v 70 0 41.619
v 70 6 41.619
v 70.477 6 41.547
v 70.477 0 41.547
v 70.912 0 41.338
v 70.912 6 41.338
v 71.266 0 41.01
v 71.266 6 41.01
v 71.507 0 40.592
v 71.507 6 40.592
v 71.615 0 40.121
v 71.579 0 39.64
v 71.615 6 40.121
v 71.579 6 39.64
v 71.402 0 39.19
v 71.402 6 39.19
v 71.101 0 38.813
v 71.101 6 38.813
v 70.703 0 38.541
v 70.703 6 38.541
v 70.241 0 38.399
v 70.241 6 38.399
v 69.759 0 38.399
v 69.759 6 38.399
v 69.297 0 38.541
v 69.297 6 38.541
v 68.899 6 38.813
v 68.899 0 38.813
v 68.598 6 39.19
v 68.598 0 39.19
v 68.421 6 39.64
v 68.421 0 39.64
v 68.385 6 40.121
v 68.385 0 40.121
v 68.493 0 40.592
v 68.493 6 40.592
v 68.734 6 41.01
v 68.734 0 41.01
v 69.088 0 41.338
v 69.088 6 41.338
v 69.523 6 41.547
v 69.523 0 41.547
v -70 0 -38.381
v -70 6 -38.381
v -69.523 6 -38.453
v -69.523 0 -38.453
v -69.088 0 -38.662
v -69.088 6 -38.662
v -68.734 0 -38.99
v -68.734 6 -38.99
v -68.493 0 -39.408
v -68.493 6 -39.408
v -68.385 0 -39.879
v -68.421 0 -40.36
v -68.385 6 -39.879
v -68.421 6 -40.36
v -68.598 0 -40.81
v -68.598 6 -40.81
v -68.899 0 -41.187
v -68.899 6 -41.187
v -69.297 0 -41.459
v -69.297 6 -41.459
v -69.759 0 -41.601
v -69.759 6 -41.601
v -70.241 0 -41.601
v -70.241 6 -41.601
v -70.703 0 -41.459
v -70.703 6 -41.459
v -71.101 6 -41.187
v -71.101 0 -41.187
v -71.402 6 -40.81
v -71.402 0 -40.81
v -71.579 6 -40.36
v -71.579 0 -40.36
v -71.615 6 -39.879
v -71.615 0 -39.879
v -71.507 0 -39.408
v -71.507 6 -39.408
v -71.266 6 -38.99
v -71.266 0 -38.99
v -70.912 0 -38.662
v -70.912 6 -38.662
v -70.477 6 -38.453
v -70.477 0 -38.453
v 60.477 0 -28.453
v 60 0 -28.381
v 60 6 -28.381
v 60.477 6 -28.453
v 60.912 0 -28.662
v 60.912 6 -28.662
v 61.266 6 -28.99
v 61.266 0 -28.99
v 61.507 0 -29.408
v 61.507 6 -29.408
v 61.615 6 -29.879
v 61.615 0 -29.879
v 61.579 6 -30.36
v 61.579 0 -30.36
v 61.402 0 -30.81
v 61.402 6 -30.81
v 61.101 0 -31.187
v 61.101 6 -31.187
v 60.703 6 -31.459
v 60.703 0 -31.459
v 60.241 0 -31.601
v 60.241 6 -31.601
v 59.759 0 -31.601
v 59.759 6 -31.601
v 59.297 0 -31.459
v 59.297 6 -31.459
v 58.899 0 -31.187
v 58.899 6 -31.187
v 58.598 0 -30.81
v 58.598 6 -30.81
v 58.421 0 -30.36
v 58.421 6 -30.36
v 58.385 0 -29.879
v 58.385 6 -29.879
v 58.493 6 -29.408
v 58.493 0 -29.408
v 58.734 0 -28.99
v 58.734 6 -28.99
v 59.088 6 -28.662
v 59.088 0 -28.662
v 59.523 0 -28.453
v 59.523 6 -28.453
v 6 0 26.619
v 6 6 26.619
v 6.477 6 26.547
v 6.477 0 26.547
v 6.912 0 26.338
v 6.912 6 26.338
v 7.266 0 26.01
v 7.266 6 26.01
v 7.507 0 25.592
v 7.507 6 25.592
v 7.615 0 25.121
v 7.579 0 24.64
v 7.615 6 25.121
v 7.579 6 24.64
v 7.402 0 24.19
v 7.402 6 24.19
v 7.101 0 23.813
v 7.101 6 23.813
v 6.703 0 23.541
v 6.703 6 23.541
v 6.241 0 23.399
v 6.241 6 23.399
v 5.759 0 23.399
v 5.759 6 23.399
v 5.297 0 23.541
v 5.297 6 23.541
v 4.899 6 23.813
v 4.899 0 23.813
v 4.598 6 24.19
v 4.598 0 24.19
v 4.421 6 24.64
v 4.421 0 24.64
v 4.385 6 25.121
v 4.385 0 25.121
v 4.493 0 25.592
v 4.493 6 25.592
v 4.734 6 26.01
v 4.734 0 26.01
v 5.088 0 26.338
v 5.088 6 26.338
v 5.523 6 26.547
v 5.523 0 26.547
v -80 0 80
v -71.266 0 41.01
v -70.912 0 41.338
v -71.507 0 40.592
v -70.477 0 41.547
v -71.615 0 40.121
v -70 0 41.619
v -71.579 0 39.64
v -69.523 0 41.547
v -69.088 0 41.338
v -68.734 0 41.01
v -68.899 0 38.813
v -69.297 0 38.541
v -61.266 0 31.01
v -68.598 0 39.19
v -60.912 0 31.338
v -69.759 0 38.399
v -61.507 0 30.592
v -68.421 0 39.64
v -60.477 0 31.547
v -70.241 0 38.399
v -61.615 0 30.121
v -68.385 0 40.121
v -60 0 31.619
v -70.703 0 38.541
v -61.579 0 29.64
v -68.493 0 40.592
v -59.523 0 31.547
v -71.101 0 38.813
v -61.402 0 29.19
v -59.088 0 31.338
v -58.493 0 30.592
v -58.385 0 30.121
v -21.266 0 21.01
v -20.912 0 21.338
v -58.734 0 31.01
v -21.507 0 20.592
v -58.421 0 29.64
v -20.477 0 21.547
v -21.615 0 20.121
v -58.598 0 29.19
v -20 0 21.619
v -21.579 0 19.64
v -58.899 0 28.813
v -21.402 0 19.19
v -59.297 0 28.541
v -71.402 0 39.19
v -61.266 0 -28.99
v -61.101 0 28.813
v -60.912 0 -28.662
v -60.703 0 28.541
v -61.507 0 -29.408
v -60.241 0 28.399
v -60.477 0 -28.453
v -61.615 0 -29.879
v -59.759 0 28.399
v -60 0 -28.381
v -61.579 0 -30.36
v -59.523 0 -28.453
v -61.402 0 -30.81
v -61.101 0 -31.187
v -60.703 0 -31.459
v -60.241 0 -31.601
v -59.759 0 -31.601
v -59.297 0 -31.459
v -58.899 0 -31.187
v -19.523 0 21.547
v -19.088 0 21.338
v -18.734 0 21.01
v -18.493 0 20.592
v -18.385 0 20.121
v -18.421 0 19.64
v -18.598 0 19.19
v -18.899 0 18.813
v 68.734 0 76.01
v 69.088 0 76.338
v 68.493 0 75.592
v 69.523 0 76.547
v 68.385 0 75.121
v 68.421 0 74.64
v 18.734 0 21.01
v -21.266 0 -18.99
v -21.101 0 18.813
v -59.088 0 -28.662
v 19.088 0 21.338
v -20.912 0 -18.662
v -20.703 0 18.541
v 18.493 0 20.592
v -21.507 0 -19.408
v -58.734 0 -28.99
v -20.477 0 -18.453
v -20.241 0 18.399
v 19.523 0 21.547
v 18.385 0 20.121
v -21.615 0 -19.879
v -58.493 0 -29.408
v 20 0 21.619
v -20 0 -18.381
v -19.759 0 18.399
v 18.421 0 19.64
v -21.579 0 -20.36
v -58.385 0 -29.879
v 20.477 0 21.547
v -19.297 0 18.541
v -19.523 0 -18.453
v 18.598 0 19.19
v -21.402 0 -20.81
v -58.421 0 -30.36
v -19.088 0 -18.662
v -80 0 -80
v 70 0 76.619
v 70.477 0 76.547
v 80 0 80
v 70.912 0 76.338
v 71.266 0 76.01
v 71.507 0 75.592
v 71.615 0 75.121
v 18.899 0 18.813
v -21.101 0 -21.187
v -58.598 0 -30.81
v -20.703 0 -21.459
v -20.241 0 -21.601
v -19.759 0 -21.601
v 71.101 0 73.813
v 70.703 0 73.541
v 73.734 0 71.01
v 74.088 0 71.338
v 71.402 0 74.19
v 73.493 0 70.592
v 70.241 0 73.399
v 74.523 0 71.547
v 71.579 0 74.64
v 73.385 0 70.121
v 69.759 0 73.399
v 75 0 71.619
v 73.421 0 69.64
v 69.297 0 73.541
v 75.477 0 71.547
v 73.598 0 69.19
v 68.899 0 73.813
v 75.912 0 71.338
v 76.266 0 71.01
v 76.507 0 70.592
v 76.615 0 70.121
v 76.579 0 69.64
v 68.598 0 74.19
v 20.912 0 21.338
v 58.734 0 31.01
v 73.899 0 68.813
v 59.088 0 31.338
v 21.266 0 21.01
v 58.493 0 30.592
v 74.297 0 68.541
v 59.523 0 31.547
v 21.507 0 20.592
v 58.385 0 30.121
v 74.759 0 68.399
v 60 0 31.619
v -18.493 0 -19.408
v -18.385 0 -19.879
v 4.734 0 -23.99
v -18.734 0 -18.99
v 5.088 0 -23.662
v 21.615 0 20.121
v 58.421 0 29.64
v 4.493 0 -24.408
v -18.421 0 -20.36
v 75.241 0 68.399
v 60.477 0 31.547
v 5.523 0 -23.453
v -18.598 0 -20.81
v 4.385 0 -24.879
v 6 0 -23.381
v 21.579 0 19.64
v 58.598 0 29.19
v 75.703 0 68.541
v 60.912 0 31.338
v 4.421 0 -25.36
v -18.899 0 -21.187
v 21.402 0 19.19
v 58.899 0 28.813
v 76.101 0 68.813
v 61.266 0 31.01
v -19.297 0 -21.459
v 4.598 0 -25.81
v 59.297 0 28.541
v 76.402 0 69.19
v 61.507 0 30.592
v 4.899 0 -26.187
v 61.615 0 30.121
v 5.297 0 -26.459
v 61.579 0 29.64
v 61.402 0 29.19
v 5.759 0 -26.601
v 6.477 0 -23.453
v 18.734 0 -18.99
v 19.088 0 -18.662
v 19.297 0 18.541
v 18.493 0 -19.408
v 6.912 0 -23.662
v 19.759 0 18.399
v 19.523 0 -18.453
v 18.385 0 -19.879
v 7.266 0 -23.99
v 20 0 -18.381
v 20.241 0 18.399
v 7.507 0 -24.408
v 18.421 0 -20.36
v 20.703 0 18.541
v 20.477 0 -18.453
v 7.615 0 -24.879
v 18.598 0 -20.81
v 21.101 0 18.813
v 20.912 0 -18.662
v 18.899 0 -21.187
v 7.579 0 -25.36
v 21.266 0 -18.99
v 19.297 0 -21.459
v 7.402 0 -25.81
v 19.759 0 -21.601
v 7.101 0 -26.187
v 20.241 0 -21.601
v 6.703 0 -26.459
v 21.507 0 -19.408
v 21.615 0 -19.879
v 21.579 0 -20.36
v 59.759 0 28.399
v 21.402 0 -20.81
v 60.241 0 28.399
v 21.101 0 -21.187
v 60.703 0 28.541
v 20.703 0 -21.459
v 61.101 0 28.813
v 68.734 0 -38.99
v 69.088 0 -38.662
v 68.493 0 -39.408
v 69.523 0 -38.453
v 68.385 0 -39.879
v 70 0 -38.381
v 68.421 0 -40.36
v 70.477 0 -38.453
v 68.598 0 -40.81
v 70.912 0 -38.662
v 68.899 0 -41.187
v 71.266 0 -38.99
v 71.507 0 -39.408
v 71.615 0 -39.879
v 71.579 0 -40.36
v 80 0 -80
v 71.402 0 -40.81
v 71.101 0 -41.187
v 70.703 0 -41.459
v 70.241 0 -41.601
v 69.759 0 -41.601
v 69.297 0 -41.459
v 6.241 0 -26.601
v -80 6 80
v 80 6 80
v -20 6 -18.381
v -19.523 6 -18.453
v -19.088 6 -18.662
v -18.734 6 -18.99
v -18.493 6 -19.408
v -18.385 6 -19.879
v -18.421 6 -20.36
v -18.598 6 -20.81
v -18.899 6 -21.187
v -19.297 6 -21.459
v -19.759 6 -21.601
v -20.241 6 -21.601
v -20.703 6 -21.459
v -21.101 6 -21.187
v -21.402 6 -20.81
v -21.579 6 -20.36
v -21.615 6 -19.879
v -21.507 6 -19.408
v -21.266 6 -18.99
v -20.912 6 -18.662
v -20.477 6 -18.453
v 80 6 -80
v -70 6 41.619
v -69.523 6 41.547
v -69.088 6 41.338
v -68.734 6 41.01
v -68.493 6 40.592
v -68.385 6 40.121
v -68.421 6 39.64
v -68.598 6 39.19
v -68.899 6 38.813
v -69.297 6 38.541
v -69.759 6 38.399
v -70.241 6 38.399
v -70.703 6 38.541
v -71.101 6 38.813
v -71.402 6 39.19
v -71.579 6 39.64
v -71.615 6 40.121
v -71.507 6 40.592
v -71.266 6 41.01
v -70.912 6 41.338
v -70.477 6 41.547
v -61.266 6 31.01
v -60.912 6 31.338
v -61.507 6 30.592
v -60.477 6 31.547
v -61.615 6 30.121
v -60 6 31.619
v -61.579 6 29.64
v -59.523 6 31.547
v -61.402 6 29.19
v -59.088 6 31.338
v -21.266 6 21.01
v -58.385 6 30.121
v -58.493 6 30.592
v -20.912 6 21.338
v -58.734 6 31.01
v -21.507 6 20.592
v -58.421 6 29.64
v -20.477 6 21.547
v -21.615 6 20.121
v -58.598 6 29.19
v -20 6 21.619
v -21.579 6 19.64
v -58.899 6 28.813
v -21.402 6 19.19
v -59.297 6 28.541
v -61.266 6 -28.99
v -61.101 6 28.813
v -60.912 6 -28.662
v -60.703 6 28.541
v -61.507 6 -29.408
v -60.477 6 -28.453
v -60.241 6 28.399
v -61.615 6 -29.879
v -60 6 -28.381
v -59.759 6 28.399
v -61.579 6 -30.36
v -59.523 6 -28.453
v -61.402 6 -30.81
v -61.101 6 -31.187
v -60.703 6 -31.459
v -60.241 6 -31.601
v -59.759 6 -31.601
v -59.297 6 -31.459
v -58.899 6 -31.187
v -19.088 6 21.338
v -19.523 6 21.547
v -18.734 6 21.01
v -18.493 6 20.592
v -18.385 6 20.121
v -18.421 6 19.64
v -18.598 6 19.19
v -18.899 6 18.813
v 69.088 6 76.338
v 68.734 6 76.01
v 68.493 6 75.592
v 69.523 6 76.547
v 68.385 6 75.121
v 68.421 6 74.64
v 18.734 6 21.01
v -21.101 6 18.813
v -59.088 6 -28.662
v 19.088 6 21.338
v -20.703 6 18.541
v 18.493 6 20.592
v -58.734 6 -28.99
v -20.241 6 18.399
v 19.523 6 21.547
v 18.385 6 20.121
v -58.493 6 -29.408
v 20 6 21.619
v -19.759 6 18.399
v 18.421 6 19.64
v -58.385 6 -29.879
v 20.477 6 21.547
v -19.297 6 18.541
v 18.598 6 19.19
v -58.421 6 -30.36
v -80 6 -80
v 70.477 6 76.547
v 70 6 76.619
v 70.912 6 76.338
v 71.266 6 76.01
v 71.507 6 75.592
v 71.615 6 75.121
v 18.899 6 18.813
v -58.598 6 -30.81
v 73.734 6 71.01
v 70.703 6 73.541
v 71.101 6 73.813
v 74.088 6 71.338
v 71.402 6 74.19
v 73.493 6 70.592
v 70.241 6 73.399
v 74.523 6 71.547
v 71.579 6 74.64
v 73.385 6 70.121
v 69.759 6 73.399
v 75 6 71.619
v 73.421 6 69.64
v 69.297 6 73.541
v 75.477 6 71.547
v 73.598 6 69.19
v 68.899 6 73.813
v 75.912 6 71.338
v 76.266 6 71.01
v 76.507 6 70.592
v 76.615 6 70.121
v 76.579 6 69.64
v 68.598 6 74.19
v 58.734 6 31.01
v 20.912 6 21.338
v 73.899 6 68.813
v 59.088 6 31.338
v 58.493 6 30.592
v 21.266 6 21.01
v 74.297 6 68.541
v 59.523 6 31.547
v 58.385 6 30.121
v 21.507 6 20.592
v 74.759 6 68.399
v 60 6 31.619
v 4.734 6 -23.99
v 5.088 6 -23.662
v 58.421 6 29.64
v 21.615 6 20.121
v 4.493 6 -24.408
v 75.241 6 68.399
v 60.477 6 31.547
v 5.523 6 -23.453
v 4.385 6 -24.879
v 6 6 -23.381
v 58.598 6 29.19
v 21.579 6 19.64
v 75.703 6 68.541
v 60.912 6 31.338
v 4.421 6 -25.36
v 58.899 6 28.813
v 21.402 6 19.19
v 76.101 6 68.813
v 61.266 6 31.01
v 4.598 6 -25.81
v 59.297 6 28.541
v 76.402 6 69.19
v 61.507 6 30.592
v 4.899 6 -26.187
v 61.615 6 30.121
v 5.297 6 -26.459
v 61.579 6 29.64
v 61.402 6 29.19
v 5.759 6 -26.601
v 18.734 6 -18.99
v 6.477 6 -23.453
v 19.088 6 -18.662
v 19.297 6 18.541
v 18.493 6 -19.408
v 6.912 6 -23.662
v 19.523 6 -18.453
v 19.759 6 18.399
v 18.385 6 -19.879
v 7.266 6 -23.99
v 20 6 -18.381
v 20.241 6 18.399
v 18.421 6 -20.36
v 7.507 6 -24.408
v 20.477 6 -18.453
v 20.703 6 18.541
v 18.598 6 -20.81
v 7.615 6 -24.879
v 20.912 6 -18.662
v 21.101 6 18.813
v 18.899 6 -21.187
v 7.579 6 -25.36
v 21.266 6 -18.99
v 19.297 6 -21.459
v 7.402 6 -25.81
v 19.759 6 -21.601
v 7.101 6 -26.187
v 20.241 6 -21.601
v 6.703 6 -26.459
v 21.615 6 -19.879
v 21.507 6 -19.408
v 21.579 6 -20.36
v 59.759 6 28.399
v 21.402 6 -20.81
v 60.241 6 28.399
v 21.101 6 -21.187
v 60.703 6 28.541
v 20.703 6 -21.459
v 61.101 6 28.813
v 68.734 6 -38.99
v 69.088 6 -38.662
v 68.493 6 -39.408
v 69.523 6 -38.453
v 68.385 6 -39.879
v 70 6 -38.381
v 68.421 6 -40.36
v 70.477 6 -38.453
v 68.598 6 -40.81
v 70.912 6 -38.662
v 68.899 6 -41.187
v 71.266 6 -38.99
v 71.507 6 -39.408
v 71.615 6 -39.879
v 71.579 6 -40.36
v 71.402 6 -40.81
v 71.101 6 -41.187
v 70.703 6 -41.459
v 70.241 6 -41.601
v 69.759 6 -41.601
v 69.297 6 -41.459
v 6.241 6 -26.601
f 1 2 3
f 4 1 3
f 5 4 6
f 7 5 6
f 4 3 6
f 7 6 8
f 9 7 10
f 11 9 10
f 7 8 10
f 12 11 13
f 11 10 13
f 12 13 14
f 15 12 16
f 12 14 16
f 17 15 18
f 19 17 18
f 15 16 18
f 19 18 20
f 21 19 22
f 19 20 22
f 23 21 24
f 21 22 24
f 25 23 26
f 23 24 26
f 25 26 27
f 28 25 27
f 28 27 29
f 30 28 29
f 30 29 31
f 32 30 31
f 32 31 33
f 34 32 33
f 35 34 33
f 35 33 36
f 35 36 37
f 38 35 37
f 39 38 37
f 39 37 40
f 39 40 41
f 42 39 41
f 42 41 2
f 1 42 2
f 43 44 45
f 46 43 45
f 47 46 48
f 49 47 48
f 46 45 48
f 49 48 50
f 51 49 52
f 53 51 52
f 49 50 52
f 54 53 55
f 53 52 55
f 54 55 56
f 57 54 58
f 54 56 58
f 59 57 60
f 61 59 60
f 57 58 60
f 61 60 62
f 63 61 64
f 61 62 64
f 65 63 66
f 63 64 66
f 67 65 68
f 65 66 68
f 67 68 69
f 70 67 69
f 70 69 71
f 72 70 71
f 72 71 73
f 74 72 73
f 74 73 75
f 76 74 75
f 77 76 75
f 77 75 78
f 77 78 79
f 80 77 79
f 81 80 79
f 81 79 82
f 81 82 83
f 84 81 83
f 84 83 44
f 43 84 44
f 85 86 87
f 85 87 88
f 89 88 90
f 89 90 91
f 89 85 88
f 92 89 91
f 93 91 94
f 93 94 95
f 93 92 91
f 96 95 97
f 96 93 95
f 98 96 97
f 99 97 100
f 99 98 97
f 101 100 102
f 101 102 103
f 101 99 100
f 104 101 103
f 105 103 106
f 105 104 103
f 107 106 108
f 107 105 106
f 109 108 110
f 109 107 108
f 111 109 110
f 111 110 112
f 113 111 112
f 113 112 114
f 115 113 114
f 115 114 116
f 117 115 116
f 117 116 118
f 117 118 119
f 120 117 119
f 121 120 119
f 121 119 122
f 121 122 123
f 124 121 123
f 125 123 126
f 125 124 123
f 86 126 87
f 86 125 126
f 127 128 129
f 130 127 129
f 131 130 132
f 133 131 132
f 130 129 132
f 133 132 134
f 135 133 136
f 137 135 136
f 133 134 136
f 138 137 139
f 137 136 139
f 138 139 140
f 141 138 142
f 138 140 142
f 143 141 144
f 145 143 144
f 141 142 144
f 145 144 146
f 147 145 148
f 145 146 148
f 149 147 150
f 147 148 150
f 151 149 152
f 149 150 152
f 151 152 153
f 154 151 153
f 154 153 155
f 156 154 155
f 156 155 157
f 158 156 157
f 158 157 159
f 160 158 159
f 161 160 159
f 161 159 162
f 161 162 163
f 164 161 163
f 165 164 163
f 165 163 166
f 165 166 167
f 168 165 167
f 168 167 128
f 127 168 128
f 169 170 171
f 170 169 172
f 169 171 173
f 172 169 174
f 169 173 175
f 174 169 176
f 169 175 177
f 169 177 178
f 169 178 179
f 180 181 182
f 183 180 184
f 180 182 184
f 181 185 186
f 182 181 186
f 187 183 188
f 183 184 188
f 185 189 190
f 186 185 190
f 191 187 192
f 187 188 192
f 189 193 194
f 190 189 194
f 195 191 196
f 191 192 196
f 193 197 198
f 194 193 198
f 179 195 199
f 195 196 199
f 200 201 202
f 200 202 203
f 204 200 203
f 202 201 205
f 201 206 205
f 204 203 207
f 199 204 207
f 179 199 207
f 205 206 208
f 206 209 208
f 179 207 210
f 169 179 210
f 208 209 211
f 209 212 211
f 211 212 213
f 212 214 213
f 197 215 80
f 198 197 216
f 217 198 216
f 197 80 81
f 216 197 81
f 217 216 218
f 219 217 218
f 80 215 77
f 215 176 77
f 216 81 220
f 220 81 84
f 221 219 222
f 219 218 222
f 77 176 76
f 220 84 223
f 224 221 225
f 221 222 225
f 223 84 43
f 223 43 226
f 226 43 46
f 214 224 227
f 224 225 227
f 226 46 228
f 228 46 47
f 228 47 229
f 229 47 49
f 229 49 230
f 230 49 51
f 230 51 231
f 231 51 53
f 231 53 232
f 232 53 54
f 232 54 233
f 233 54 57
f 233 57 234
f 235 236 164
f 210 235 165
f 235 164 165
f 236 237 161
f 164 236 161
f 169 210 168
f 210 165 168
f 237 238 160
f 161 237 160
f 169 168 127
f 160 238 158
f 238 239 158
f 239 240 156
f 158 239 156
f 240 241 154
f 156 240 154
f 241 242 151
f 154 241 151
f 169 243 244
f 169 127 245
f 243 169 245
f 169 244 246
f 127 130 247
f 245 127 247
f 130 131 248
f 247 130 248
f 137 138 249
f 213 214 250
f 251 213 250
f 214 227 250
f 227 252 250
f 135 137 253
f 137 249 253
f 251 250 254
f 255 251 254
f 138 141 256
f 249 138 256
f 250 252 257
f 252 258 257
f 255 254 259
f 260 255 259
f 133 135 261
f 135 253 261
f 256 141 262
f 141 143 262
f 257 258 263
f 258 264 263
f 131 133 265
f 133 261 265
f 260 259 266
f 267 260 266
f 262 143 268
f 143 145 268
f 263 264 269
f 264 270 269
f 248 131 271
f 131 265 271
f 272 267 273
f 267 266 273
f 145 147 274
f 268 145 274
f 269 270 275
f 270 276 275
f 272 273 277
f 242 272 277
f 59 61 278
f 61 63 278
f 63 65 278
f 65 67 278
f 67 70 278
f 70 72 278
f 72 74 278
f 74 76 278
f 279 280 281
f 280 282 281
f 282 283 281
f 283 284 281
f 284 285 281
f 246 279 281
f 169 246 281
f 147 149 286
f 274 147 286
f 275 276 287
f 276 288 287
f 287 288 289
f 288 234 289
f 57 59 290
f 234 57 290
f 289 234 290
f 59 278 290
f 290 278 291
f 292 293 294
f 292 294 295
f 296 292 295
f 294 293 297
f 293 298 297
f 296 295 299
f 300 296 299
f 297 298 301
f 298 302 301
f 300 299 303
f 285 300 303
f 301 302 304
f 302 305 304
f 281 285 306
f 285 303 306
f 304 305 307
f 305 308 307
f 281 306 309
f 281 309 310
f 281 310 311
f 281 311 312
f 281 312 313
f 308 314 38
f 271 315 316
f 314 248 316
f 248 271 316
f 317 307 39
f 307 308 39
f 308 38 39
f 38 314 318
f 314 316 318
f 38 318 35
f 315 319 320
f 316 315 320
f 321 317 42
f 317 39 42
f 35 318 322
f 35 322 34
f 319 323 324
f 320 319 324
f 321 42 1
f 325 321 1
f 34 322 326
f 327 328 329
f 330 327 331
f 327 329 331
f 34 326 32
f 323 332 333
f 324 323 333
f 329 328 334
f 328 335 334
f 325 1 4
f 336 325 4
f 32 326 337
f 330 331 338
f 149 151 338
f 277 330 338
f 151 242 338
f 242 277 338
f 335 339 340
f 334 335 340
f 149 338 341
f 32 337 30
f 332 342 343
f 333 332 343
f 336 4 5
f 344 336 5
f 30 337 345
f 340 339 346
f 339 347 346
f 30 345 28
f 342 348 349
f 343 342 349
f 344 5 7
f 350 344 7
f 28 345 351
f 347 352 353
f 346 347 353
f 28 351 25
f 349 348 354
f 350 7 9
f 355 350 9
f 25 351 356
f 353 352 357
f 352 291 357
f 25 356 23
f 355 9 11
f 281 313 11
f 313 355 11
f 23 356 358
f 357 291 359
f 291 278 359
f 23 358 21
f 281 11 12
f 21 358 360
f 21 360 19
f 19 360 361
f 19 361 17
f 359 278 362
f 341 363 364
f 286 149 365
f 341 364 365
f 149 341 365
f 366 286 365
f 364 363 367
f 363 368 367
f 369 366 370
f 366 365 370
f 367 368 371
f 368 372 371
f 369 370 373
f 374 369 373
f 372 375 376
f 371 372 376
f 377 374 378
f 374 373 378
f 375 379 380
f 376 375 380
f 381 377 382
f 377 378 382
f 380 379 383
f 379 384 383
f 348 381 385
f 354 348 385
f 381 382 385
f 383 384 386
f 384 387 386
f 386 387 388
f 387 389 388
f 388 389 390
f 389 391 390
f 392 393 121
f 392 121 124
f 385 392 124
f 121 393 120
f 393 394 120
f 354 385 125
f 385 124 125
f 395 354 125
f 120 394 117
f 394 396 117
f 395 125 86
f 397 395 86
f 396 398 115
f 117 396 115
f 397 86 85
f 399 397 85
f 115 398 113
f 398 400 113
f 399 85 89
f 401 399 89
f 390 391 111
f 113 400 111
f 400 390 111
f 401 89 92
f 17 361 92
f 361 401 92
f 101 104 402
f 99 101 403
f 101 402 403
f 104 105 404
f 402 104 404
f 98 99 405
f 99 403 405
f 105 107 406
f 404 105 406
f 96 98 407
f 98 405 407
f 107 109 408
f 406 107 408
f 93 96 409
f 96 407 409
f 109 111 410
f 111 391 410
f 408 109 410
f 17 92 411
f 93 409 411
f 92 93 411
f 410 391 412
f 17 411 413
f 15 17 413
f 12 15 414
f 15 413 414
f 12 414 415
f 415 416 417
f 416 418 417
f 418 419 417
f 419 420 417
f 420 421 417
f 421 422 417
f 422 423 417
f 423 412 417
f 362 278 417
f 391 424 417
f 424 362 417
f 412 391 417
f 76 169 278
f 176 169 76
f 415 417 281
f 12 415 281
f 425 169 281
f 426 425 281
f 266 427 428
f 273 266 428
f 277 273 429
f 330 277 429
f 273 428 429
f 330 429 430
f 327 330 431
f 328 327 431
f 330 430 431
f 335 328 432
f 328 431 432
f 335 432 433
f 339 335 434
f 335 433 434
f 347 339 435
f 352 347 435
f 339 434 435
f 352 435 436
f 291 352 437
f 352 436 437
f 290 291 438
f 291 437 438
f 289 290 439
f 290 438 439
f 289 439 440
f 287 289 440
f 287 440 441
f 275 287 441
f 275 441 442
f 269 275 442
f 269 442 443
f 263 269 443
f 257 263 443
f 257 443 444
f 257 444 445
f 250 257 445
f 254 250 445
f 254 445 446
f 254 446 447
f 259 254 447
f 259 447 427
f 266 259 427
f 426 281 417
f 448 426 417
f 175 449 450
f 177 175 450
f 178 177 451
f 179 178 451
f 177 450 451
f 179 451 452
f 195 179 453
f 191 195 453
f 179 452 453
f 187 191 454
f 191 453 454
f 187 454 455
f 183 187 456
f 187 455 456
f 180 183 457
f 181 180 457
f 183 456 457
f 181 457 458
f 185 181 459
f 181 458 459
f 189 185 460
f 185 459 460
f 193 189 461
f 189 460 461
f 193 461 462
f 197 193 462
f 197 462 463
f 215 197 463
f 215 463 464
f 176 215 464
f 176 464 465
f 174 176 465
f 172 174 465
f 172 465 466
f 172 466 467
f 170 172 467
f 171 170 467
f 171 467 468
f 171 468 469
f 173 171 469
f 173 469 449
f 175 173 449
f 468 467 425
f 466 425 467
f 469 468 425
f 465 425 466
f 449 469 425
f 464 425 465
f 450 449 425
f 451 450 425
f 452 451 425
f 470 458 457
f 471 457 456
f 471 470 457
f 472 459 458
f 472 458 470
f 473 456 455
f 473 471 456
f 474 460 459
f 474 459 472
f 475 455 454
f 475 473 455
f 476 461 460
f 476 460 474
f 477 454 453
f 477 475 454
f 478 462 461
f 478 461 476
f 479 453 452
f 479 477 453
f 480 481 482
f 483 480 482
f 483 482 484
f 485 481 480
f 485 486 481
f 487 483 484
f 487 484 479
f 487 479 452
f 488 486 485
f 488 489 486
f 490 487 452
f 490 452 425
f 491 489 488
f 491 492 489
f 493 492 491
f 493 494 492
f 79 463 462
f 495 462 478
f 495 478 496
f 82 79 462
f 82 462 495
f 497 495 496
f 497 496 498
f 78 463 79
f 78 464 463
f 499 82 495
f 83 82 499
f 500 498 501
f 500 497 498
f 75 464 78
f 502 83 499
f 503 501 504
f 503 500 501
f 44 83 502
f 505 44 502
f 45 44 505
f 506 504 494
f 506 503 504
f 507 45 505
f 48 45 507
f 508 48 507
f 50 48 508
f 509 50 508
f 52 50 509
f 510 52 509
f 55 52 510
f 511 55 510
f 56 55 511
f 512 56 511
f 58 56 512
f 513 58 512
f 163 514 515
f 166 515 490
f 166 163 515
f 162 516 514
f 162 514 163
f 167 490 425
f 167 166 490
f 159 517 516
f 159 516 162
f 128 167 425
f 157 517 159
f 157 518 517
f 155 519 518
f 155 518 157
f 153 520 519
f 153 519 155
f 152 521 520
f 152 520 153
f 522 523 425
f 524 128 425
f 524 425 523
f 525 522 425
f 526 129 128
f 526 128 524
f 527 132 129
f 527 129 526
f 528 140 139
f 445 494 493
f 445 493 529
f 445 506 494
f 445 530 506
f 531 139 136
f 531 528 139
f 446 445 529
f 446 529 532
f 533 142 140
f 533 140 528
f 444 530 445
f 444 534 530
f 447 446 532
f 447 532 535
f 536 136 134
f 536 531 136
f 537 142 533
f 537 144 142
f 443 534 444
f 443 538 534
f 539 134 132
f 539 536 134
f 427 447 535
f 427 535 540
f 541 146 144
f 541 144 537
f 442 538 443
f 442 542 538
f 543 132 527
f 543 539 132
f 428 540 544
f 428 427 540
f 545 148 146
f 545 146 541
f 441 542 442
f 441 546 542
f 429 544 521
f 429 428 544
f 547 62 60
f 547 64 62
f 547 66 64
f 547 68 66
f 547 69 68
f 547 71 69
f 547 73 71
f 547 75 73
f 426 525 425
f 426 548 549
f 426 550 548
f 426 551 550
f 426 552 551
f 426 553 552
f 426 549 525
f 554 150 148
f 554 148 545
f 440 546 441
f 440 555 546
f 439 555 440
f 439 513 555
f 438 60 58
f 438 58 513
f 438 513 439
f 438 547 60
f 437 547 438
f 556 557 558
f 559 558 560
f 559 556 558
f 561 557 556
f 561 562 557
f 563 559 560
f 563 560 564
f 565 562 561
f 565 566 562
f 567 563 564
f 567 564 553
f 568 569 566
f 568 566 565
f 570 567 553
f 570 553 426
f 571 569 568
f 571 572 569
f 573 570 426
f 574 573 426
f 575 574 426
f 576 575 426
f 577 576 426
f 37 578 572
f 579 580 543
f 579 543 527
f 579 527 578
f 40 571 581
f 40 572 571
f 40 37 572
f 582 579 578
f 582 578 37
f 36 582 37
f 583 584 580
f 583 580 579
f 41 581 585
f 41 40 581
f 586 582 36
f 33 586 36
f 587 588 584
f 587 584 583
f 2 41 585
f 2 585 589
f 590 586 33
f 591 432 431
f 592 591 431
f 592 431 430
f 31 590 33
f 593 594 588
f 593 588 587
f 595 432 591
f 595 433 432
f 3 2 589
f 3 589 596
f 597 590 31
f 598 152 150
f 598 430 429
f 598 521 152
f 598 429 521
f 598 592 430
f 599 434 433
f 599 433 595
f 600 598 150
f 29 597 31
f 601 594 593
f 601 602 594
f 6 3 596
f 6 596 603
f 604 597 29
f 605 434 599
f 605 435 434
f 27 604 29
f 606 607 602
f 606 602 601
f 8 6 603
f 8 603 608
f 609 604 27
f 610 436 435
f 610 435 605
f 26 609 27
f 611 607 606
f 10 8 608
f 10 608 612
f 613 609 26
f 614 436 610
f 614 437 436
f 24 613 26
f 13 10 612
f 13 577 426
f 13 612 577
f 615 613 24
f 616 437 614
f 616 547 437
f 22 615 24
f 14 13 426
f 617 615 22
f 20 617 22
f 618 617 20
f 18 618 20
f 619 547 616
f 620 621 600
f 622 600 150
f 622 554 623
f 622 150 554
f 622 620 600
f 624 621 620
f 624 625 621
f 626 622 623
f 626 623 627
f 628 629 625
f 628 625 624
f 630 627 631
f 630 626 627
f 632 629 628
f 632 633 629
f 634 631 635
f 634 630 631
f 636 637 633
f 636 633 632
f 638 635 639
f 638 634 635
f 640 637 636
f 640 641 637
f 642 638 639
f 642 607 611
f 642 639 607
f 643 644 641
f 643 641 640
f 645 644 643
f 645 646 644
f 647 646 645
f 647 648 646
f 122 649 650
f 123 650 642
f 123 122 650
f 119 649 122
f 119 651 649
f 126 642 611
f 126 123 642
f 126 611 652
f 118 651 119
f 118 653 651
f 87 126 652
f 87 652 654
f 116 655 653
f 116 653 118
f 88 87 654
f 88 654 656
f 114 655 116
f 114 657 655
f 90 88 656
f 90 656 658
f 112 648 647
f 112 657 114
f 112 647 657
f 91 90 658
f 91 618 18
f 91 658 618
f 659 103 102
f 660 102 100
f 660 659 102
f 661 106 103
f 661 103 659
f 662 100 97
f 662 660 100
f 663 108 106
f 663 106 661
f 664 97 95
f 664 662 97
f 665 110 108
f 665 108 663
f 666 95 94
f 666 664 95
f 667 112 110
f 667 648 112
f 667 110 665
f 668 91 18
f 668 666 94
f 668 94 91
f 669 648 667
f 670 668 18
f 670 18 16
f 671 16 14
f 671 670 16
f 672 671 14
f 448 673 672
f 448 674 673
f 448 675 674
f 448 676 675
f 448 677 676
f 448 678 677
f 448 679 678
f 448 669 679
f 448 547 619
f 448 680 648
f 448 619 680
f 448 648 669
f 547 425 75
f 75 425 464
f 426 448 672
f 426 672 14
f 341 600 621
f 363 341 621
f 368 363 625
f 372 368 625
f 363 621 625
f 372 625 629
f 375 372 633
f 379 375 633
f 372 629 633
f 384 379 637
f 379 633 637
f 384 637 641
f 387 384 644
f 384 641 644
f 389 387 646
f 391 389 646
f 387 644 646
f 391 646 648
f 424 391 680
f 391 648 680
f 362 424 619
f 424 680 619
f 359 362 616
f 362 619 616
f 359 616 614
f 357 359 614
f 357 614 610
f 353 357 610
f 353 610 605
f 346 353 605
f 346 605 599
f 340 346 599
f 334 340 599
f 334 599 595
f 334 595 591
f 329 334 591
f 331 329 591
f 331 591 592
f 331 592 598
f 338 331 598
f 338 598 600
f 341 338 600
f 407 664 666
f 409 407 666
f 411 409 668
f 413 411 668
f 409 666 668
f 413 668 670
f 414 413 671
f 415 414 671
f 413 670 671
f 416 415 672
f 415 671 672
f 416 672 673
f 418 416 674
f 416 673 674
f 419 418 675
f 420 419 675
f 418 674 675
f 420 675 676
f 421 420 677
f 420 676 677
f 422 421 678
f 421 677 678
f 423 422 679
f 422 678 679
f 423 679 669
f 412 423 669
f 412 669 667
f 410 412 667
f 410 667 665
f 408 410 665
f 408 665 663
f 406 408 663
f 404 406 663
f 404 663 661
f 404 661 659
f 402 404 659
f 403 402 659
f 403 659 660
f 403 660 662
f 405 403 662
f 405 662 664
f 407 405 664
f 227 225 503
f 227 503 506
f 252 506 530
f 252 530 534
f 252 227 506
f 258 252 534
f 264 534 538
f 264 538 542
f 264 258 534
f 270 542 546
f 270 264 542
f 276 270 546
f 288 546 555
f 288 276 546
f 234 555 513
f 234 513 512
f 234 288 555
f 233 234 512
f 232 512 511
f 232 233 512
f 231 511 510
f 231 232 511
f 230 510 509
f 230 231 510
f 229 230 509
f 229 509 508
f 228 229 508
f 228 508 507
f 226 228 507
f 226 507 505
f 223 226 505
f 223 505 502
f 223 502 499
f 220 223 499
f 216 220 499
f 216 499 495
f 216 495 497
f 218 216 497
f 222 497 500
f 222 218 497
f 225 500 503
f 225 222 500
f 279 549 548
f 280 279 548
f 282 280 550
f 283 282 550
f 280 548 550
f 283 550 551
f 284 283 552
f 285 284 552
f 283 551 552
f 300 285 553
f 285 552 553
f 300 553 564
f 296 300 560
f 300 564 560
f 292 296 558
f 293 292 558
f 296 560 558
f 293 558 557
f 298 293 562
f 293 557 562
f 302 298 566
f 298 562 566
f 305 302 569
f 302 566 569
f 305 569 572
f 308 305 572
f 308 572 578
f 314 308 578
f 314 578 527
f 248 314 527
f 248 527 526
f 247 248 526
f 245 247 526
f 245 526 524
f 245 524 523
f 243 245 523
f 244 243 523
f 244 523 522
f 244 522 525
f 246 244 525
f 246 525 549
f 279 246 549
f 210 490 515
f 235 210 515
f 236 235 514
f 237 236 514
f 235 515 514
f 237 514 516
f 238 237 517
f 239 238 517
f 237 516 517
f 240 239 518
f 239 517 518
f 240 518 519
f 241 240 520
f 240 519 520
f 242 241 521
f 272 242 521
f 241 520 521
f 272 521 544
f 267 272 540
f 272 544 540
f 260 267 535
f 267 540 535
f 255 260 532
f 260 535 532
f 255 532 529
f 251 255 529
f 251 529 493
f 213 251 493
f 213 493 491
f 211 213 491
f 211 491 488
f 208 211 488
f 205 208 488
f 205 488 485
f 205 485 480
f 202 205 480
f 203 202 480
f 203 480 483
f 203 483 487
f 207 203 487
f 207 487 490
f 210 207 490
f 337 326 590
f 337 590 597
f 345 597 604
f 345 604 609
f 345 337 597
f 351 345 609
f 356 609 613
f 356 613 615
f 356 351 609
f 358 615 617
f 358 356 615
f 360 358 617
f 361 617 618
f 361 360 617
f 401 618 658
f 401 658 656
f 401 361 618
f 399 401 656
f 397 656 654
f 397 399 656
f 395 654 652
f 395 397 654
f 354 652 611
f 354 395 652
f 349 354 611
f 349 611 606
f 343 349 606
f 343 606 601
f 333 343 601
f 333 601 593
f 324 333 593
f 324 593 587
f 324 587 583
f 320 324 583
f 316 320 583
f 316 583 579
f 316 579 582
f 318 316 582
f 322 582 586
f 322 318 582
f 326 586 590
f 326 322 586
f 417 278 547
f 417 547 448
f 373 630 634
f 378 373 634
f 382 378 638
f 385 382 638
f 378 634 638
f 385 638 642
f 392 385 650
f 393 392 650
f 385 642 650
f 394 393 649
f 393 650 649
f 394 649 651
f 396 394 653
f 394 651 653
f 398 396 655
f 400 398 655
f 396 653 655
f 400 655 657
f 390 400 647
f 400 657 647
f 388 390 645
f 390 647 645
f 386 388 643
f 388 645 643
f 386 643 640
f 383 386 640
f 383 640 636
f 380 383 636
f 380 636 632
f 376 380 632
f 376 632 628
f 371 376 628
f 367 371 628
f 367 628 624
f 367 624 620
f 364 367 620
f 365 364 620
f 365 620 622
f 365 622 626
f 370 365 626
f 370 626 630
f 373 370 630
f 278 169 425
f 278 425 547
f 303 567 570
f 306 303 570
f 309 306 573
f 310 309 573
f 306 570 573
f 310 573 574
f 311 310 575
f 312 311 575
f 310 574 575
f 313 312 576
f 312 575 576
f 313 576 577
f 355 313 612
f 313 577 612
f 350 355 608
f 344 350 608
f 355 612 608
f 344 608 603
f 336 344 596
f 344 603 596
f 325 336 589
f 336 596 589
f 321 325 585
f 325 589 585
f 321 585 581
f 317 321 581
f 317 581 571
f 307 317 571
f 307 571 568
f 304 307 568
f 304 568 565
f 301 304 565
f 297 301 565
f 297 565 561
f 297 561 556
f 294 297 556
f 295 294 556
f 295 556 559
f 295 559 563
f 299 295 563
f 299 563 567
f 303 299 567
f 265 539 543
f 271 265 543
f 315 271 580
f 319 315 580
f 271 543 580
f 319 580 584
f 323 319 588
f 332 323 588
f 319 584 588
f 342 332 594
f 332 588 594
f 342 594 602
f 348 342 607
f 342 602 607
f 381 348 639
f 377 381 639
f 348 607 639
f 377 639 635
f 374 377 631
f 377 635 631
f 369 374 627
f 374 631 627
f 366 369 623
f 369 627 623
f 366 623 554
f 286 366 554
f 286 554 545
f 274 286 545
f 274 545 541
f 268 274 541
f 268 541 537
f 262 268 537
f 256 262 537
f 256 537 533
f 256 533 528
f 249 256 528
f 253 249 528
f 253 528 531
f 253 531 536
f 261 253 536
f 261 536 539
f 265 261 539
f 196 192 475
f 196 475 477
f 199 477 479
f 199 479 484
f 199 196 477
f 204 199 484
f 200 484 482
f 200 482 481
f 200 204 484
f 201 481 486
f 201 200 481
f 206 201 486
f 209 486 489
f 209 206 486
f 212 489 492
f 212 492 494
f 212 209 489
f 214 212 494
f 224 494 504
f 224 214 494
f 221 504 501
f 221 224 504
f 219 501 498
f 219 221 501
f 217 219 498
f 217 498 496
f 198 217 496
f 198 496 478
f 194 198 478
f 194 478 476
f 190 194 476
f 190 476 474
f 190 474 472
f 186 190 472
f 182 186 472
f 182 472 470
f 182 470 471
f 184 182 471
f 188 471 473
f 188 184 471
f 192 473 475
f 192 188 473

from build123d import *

# Parameters (mm, degrees)
CROQUIS1_W              = 160
CROQUIS1_H              = 160
CROQUIS1_R              = 1.61925
SALIENTE_EXTRUIR1_DEPTH = 6
CROQUIS5_R              = 1.61925
ESPACIO_EXTERNO_DEPTH   = 10
CROQUIS6_R              = 1.61925
ESPACIO_CENTRO_DEPTH    = 10
CROQUIS7_R              = 1.61925
CORTAR_EXTRUIR1_DEPTH   = 10
CROQUIS8_R              = 1.61925
CORTAR_EXTRUIR2_DEPTH   = 13


with BuildPart() as part:
    # Croquis1 → Saliente-Extruir1 (new body)
    with BuildSketch(Plane(origin=(0, 0, 0), x_dir=(1, 0, 0), z_dir=(0, 1, 0))):
        Rectangle(CROQUIS1_W, CROQUIS1_H)
        with Locations(Location((-60, 30, 0), (0, 0, 270))):
            Circle(CROQUIS1_R, mode=Mode.SUBTRACT)
        with Locations(Location((-60, -30, 0), (0, 0, 270))):
            Circle(CROQUIS1_R, mode=Mode.SUBTRACT)
        with Locations(Location((60, -30, 0), (0, 0, 270))):
            Circle(CROQUIS1_R, mode=Mode.SUBTRACT)
        with Locations(Location((60, 30, 0), (0, 0, 270))):
            Circle(CROQUIS1_R, mode=Mode.SUBTRACT)
    extrude(amount=SALIENTE_EXTRUIR1_DEPTH)

    # Croquis5 → Espacio_externo (cut)
    with BuildSketch(Plane(origin=(0, 6, 0), x_dir=(1, 0, 0), z_dir=(0, 1, 0))):
        with Locations(Location((-70, 40, 0), (0, 0, 270))):
            Circle(CROQUIS5_R)
        with Locations(Location((70, 40, 0), (0, 0, 270))):
            Circle(CROQUIS5_R)
        with Locations(Location((70, -40, 0), (0, 0, 270))):
            Circle(CROQUIS5_R)
        with Locations(Location((-70, -40, 0), (0, 0, 270))):
            Circle(CROQUIS5_R)
    extrude(amount=-ESPACIO_EXTERNO_DEPTH, mode=Mode.SUBTRACT)

    # Croquis6 → Espacio_Centro (cut)
    with BuildSketch(Plane(origin=(0, 6, 0), x_dir=(1, 0, 0), z_dir=(0, 1, 0))):
        with Locations(Location((-20, 20, 0), (0, 0, 270))):
            Circle(CROQUIS6_R)
        with Locations(Location((20, 20, 0), (0, 0, 270))):
            Circle(CROQUIS6_R)
        with Locations(Location((20, -20, 0), (0, 0, 270))):
            Circle(CROQUIS6_R)
        with Locations(Location((-20, -20, 0), (0, 0, 270))):
            Circle(CROQUIS6_R)
    extrude(amount=-ESPACIO_CENTRO_DEPTH, mode=Mode.SUBTRACT)

    # Croquis7 → Cortar-Extruir1 (cut)
    with BuildSketch(Plane(origin=(0, 6, 0), x_dir=(1, 0, 0), z_dir=(0, 1, 0))):
        with Locations(Location((6, 25, 0), (0, 0, 270))):
            Circle(CROQUIS7_R)
        with Locations(Location((6, -25, 0), (0, 0, 270))):
            Circle(CROQUIS7_R)
    extrude(amount=-CORTAR_EXTRUIR1_DEPTH, mode=Mode.SUBTRACT)

    # Croquis8 → Cortar-Extruir2 (cut)
    with BuildSketch(Plane(origin=(0, 6, 0), x_dir=(1, 0, 0), z_dir=(0, 1, 0))):
        with Locations(Location((70, -75, 0), (0, 0, 270))):
            Circle(CROQUIS8_R)
        with Locations(Location((75, -70, 0), (0, 0, 270))):
            Circle(CROQUIS8_R)
    extrude(amount=-CORTAR_EXTRUIR2_DEPTH, mode=Mode.SUBTRACT)


solid = part.part
